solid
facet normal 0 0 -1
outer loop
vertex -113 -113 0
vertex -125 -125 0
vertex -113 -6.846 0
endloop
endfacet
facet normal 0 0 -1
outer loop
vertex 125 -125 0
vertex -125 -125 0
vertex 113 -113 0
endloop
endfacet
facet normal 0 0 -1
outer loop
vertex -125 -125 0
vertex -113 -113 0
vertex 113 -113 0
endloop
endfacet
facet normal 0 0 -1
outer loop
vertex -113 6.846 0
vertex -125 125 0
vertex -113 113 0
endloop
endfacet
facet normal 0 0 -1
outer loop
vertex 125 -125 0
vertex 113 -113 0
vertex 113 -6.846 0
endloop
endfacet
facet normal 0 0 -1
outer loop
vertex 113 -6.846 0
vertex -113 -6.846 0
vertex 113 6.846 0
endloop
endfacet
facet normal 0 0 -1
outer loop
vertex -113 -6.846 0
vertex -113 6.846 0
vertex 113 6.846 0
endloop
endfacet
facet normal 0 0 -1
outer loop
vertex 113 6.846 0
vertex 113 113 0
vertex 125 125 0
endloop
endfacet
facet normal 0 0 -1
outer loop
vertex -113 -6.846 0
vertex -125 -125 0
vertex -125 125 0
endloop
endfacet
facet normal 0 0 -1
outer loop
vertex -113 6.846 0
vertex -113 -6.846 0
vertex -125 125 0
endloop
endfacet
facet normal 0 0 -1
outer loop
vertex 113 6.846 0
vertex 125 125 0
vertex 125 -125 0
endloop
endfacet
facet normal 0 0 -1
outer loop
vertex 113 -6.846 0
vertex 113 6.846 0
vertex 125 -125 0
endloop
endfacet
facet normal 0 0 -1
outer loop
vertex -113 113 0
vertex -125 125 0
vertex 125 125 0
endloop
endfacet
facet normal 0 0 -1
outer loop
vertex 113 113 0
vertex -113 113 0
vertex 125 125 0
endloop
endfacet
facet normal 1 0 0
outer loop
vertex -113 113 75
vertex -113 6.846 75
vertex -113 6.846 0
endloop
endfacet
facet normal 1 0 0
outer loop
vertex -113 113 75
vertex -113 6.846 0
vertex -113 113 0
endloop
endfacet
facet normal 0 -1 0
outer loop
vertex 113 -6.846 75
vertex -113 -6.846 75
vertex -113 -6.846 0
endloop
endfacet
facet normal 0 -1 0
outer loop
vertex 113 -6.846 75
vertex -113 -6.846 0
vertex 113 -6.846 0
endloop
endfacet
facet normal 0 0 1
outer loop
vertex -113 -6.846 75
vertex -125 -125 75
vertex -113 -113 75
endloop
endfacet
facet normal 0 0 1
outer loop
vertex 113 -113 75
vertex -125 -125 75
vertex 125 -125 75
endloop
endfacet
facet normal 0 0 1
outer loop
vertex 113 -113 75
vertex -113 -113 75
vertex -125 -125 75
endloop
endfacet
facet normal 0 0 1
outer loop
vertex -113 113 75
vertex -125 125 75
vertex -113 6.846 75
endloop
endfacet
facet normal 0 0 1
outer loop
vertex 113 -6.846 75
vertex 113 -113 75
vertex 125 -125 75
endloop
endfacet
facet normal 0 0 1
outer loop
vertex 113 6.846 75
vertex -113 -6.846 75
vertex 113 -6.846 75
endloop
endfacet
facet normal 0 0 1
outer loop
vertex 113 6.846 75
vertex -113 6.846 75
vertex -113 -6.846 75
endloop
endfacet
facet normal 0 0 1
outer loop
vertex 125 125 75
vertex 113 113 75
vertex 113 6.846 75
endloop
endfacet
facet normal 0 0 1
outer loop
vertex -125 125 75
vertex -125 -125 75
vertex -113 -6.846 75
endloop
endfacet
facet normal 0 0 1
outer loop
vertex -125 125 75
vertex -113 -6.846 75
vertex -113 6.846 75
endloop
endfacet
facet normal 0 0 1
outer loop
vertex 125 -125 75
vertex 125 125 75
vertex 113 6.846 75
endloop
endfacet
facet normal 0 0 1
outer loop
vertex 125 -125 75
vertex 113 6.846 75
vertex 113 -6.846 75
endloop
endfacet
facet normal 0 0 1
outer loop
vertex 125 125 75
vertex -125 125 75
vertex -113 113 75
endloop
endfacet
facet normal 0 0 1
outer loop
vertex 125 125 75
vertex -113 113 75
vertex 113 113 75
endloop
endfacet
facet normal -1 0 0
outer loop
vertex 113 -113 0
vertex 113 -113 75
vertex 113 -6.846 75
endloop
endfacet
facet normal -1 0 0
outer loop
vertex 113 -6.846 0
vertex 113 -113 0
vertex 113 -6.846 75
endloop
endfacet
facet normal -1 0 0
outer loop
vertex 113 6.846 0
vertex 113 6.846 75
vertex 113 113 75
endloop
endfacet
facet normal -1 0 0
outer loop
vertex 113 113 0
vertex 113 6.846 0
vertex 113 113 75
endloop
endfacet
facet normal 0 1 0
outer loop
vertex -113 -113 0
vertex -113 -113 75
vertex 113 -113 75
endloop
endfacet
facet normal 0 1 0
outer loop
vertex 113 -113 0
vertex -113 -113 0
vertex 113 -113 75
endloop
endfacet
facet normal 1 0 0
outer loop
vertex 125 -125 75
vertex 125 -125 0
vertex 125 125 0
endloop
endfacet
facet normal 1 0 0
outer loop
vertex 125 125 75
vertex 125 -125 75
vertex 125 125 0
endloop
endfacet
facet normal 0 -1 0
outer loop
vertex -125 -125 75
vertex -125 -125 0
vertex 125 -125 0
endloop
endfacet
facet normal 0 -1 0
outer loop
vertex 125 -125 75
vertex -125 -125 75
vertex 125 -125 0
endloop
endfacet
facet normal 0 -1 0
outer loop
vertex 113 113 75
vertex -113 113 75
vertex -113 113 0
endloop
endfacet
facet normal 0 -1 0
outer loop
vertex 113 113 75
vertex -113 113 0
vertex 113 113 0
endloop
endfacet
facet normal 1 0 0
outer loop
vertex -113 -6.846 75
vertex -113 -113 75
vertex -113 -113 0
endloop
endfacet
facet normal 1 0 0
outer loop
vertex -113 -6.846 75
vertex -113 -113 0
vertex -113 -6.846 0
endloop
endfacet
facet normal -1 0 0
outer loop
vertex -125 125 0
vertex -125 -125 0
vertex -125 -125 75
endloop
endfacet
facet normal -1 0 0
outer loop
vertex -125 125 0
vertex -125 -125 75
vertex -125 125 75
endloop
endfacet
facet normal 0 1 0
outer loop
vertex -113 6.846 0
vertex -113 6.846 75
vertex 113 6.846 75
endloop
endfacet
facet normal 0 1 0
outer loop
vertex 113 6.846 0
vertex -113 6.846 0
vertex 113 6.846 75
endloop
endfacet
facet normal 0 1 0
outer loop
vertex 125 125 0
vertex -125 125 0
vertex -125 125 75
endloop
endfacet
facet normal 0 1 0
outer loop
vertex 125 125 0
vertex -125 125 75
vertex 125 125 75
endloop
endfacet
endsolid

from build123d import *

# Parameters (mm, degrees)
F0_W     = 250
F0_H     = 250
F1_DEPTH = 75
F2_W     = 226
F2_H     = 226
F3_DEPTH = 101.6
F4_W     = 226
F4_H     = 13.691548
F5_DEPTH = 75


with BuildPart() as f1:
    # F0 (on Top) → F1 (new body)
    with BuildSketch(Plane.XY):
        Rectangle(F0_W, F0_H)
    extrude(amount=F1_DEPTH)

    # F2 (on face) → F3 (cut)
    with BuildSketch(Plane.XY.offset(75)):
        Rectangle(F2_W, F2_H)
    extrude(amount=-F3_DEPTH, mode=Mode.SUBTRACT)

    # F4 (on face) → F5 (join)
    with BuildSketch(Plane.XY.offset(75)):
        Rectangle(F4_W, F4_H)
    extrude(amount=-F5_DEPTH)


solid = f1.part
